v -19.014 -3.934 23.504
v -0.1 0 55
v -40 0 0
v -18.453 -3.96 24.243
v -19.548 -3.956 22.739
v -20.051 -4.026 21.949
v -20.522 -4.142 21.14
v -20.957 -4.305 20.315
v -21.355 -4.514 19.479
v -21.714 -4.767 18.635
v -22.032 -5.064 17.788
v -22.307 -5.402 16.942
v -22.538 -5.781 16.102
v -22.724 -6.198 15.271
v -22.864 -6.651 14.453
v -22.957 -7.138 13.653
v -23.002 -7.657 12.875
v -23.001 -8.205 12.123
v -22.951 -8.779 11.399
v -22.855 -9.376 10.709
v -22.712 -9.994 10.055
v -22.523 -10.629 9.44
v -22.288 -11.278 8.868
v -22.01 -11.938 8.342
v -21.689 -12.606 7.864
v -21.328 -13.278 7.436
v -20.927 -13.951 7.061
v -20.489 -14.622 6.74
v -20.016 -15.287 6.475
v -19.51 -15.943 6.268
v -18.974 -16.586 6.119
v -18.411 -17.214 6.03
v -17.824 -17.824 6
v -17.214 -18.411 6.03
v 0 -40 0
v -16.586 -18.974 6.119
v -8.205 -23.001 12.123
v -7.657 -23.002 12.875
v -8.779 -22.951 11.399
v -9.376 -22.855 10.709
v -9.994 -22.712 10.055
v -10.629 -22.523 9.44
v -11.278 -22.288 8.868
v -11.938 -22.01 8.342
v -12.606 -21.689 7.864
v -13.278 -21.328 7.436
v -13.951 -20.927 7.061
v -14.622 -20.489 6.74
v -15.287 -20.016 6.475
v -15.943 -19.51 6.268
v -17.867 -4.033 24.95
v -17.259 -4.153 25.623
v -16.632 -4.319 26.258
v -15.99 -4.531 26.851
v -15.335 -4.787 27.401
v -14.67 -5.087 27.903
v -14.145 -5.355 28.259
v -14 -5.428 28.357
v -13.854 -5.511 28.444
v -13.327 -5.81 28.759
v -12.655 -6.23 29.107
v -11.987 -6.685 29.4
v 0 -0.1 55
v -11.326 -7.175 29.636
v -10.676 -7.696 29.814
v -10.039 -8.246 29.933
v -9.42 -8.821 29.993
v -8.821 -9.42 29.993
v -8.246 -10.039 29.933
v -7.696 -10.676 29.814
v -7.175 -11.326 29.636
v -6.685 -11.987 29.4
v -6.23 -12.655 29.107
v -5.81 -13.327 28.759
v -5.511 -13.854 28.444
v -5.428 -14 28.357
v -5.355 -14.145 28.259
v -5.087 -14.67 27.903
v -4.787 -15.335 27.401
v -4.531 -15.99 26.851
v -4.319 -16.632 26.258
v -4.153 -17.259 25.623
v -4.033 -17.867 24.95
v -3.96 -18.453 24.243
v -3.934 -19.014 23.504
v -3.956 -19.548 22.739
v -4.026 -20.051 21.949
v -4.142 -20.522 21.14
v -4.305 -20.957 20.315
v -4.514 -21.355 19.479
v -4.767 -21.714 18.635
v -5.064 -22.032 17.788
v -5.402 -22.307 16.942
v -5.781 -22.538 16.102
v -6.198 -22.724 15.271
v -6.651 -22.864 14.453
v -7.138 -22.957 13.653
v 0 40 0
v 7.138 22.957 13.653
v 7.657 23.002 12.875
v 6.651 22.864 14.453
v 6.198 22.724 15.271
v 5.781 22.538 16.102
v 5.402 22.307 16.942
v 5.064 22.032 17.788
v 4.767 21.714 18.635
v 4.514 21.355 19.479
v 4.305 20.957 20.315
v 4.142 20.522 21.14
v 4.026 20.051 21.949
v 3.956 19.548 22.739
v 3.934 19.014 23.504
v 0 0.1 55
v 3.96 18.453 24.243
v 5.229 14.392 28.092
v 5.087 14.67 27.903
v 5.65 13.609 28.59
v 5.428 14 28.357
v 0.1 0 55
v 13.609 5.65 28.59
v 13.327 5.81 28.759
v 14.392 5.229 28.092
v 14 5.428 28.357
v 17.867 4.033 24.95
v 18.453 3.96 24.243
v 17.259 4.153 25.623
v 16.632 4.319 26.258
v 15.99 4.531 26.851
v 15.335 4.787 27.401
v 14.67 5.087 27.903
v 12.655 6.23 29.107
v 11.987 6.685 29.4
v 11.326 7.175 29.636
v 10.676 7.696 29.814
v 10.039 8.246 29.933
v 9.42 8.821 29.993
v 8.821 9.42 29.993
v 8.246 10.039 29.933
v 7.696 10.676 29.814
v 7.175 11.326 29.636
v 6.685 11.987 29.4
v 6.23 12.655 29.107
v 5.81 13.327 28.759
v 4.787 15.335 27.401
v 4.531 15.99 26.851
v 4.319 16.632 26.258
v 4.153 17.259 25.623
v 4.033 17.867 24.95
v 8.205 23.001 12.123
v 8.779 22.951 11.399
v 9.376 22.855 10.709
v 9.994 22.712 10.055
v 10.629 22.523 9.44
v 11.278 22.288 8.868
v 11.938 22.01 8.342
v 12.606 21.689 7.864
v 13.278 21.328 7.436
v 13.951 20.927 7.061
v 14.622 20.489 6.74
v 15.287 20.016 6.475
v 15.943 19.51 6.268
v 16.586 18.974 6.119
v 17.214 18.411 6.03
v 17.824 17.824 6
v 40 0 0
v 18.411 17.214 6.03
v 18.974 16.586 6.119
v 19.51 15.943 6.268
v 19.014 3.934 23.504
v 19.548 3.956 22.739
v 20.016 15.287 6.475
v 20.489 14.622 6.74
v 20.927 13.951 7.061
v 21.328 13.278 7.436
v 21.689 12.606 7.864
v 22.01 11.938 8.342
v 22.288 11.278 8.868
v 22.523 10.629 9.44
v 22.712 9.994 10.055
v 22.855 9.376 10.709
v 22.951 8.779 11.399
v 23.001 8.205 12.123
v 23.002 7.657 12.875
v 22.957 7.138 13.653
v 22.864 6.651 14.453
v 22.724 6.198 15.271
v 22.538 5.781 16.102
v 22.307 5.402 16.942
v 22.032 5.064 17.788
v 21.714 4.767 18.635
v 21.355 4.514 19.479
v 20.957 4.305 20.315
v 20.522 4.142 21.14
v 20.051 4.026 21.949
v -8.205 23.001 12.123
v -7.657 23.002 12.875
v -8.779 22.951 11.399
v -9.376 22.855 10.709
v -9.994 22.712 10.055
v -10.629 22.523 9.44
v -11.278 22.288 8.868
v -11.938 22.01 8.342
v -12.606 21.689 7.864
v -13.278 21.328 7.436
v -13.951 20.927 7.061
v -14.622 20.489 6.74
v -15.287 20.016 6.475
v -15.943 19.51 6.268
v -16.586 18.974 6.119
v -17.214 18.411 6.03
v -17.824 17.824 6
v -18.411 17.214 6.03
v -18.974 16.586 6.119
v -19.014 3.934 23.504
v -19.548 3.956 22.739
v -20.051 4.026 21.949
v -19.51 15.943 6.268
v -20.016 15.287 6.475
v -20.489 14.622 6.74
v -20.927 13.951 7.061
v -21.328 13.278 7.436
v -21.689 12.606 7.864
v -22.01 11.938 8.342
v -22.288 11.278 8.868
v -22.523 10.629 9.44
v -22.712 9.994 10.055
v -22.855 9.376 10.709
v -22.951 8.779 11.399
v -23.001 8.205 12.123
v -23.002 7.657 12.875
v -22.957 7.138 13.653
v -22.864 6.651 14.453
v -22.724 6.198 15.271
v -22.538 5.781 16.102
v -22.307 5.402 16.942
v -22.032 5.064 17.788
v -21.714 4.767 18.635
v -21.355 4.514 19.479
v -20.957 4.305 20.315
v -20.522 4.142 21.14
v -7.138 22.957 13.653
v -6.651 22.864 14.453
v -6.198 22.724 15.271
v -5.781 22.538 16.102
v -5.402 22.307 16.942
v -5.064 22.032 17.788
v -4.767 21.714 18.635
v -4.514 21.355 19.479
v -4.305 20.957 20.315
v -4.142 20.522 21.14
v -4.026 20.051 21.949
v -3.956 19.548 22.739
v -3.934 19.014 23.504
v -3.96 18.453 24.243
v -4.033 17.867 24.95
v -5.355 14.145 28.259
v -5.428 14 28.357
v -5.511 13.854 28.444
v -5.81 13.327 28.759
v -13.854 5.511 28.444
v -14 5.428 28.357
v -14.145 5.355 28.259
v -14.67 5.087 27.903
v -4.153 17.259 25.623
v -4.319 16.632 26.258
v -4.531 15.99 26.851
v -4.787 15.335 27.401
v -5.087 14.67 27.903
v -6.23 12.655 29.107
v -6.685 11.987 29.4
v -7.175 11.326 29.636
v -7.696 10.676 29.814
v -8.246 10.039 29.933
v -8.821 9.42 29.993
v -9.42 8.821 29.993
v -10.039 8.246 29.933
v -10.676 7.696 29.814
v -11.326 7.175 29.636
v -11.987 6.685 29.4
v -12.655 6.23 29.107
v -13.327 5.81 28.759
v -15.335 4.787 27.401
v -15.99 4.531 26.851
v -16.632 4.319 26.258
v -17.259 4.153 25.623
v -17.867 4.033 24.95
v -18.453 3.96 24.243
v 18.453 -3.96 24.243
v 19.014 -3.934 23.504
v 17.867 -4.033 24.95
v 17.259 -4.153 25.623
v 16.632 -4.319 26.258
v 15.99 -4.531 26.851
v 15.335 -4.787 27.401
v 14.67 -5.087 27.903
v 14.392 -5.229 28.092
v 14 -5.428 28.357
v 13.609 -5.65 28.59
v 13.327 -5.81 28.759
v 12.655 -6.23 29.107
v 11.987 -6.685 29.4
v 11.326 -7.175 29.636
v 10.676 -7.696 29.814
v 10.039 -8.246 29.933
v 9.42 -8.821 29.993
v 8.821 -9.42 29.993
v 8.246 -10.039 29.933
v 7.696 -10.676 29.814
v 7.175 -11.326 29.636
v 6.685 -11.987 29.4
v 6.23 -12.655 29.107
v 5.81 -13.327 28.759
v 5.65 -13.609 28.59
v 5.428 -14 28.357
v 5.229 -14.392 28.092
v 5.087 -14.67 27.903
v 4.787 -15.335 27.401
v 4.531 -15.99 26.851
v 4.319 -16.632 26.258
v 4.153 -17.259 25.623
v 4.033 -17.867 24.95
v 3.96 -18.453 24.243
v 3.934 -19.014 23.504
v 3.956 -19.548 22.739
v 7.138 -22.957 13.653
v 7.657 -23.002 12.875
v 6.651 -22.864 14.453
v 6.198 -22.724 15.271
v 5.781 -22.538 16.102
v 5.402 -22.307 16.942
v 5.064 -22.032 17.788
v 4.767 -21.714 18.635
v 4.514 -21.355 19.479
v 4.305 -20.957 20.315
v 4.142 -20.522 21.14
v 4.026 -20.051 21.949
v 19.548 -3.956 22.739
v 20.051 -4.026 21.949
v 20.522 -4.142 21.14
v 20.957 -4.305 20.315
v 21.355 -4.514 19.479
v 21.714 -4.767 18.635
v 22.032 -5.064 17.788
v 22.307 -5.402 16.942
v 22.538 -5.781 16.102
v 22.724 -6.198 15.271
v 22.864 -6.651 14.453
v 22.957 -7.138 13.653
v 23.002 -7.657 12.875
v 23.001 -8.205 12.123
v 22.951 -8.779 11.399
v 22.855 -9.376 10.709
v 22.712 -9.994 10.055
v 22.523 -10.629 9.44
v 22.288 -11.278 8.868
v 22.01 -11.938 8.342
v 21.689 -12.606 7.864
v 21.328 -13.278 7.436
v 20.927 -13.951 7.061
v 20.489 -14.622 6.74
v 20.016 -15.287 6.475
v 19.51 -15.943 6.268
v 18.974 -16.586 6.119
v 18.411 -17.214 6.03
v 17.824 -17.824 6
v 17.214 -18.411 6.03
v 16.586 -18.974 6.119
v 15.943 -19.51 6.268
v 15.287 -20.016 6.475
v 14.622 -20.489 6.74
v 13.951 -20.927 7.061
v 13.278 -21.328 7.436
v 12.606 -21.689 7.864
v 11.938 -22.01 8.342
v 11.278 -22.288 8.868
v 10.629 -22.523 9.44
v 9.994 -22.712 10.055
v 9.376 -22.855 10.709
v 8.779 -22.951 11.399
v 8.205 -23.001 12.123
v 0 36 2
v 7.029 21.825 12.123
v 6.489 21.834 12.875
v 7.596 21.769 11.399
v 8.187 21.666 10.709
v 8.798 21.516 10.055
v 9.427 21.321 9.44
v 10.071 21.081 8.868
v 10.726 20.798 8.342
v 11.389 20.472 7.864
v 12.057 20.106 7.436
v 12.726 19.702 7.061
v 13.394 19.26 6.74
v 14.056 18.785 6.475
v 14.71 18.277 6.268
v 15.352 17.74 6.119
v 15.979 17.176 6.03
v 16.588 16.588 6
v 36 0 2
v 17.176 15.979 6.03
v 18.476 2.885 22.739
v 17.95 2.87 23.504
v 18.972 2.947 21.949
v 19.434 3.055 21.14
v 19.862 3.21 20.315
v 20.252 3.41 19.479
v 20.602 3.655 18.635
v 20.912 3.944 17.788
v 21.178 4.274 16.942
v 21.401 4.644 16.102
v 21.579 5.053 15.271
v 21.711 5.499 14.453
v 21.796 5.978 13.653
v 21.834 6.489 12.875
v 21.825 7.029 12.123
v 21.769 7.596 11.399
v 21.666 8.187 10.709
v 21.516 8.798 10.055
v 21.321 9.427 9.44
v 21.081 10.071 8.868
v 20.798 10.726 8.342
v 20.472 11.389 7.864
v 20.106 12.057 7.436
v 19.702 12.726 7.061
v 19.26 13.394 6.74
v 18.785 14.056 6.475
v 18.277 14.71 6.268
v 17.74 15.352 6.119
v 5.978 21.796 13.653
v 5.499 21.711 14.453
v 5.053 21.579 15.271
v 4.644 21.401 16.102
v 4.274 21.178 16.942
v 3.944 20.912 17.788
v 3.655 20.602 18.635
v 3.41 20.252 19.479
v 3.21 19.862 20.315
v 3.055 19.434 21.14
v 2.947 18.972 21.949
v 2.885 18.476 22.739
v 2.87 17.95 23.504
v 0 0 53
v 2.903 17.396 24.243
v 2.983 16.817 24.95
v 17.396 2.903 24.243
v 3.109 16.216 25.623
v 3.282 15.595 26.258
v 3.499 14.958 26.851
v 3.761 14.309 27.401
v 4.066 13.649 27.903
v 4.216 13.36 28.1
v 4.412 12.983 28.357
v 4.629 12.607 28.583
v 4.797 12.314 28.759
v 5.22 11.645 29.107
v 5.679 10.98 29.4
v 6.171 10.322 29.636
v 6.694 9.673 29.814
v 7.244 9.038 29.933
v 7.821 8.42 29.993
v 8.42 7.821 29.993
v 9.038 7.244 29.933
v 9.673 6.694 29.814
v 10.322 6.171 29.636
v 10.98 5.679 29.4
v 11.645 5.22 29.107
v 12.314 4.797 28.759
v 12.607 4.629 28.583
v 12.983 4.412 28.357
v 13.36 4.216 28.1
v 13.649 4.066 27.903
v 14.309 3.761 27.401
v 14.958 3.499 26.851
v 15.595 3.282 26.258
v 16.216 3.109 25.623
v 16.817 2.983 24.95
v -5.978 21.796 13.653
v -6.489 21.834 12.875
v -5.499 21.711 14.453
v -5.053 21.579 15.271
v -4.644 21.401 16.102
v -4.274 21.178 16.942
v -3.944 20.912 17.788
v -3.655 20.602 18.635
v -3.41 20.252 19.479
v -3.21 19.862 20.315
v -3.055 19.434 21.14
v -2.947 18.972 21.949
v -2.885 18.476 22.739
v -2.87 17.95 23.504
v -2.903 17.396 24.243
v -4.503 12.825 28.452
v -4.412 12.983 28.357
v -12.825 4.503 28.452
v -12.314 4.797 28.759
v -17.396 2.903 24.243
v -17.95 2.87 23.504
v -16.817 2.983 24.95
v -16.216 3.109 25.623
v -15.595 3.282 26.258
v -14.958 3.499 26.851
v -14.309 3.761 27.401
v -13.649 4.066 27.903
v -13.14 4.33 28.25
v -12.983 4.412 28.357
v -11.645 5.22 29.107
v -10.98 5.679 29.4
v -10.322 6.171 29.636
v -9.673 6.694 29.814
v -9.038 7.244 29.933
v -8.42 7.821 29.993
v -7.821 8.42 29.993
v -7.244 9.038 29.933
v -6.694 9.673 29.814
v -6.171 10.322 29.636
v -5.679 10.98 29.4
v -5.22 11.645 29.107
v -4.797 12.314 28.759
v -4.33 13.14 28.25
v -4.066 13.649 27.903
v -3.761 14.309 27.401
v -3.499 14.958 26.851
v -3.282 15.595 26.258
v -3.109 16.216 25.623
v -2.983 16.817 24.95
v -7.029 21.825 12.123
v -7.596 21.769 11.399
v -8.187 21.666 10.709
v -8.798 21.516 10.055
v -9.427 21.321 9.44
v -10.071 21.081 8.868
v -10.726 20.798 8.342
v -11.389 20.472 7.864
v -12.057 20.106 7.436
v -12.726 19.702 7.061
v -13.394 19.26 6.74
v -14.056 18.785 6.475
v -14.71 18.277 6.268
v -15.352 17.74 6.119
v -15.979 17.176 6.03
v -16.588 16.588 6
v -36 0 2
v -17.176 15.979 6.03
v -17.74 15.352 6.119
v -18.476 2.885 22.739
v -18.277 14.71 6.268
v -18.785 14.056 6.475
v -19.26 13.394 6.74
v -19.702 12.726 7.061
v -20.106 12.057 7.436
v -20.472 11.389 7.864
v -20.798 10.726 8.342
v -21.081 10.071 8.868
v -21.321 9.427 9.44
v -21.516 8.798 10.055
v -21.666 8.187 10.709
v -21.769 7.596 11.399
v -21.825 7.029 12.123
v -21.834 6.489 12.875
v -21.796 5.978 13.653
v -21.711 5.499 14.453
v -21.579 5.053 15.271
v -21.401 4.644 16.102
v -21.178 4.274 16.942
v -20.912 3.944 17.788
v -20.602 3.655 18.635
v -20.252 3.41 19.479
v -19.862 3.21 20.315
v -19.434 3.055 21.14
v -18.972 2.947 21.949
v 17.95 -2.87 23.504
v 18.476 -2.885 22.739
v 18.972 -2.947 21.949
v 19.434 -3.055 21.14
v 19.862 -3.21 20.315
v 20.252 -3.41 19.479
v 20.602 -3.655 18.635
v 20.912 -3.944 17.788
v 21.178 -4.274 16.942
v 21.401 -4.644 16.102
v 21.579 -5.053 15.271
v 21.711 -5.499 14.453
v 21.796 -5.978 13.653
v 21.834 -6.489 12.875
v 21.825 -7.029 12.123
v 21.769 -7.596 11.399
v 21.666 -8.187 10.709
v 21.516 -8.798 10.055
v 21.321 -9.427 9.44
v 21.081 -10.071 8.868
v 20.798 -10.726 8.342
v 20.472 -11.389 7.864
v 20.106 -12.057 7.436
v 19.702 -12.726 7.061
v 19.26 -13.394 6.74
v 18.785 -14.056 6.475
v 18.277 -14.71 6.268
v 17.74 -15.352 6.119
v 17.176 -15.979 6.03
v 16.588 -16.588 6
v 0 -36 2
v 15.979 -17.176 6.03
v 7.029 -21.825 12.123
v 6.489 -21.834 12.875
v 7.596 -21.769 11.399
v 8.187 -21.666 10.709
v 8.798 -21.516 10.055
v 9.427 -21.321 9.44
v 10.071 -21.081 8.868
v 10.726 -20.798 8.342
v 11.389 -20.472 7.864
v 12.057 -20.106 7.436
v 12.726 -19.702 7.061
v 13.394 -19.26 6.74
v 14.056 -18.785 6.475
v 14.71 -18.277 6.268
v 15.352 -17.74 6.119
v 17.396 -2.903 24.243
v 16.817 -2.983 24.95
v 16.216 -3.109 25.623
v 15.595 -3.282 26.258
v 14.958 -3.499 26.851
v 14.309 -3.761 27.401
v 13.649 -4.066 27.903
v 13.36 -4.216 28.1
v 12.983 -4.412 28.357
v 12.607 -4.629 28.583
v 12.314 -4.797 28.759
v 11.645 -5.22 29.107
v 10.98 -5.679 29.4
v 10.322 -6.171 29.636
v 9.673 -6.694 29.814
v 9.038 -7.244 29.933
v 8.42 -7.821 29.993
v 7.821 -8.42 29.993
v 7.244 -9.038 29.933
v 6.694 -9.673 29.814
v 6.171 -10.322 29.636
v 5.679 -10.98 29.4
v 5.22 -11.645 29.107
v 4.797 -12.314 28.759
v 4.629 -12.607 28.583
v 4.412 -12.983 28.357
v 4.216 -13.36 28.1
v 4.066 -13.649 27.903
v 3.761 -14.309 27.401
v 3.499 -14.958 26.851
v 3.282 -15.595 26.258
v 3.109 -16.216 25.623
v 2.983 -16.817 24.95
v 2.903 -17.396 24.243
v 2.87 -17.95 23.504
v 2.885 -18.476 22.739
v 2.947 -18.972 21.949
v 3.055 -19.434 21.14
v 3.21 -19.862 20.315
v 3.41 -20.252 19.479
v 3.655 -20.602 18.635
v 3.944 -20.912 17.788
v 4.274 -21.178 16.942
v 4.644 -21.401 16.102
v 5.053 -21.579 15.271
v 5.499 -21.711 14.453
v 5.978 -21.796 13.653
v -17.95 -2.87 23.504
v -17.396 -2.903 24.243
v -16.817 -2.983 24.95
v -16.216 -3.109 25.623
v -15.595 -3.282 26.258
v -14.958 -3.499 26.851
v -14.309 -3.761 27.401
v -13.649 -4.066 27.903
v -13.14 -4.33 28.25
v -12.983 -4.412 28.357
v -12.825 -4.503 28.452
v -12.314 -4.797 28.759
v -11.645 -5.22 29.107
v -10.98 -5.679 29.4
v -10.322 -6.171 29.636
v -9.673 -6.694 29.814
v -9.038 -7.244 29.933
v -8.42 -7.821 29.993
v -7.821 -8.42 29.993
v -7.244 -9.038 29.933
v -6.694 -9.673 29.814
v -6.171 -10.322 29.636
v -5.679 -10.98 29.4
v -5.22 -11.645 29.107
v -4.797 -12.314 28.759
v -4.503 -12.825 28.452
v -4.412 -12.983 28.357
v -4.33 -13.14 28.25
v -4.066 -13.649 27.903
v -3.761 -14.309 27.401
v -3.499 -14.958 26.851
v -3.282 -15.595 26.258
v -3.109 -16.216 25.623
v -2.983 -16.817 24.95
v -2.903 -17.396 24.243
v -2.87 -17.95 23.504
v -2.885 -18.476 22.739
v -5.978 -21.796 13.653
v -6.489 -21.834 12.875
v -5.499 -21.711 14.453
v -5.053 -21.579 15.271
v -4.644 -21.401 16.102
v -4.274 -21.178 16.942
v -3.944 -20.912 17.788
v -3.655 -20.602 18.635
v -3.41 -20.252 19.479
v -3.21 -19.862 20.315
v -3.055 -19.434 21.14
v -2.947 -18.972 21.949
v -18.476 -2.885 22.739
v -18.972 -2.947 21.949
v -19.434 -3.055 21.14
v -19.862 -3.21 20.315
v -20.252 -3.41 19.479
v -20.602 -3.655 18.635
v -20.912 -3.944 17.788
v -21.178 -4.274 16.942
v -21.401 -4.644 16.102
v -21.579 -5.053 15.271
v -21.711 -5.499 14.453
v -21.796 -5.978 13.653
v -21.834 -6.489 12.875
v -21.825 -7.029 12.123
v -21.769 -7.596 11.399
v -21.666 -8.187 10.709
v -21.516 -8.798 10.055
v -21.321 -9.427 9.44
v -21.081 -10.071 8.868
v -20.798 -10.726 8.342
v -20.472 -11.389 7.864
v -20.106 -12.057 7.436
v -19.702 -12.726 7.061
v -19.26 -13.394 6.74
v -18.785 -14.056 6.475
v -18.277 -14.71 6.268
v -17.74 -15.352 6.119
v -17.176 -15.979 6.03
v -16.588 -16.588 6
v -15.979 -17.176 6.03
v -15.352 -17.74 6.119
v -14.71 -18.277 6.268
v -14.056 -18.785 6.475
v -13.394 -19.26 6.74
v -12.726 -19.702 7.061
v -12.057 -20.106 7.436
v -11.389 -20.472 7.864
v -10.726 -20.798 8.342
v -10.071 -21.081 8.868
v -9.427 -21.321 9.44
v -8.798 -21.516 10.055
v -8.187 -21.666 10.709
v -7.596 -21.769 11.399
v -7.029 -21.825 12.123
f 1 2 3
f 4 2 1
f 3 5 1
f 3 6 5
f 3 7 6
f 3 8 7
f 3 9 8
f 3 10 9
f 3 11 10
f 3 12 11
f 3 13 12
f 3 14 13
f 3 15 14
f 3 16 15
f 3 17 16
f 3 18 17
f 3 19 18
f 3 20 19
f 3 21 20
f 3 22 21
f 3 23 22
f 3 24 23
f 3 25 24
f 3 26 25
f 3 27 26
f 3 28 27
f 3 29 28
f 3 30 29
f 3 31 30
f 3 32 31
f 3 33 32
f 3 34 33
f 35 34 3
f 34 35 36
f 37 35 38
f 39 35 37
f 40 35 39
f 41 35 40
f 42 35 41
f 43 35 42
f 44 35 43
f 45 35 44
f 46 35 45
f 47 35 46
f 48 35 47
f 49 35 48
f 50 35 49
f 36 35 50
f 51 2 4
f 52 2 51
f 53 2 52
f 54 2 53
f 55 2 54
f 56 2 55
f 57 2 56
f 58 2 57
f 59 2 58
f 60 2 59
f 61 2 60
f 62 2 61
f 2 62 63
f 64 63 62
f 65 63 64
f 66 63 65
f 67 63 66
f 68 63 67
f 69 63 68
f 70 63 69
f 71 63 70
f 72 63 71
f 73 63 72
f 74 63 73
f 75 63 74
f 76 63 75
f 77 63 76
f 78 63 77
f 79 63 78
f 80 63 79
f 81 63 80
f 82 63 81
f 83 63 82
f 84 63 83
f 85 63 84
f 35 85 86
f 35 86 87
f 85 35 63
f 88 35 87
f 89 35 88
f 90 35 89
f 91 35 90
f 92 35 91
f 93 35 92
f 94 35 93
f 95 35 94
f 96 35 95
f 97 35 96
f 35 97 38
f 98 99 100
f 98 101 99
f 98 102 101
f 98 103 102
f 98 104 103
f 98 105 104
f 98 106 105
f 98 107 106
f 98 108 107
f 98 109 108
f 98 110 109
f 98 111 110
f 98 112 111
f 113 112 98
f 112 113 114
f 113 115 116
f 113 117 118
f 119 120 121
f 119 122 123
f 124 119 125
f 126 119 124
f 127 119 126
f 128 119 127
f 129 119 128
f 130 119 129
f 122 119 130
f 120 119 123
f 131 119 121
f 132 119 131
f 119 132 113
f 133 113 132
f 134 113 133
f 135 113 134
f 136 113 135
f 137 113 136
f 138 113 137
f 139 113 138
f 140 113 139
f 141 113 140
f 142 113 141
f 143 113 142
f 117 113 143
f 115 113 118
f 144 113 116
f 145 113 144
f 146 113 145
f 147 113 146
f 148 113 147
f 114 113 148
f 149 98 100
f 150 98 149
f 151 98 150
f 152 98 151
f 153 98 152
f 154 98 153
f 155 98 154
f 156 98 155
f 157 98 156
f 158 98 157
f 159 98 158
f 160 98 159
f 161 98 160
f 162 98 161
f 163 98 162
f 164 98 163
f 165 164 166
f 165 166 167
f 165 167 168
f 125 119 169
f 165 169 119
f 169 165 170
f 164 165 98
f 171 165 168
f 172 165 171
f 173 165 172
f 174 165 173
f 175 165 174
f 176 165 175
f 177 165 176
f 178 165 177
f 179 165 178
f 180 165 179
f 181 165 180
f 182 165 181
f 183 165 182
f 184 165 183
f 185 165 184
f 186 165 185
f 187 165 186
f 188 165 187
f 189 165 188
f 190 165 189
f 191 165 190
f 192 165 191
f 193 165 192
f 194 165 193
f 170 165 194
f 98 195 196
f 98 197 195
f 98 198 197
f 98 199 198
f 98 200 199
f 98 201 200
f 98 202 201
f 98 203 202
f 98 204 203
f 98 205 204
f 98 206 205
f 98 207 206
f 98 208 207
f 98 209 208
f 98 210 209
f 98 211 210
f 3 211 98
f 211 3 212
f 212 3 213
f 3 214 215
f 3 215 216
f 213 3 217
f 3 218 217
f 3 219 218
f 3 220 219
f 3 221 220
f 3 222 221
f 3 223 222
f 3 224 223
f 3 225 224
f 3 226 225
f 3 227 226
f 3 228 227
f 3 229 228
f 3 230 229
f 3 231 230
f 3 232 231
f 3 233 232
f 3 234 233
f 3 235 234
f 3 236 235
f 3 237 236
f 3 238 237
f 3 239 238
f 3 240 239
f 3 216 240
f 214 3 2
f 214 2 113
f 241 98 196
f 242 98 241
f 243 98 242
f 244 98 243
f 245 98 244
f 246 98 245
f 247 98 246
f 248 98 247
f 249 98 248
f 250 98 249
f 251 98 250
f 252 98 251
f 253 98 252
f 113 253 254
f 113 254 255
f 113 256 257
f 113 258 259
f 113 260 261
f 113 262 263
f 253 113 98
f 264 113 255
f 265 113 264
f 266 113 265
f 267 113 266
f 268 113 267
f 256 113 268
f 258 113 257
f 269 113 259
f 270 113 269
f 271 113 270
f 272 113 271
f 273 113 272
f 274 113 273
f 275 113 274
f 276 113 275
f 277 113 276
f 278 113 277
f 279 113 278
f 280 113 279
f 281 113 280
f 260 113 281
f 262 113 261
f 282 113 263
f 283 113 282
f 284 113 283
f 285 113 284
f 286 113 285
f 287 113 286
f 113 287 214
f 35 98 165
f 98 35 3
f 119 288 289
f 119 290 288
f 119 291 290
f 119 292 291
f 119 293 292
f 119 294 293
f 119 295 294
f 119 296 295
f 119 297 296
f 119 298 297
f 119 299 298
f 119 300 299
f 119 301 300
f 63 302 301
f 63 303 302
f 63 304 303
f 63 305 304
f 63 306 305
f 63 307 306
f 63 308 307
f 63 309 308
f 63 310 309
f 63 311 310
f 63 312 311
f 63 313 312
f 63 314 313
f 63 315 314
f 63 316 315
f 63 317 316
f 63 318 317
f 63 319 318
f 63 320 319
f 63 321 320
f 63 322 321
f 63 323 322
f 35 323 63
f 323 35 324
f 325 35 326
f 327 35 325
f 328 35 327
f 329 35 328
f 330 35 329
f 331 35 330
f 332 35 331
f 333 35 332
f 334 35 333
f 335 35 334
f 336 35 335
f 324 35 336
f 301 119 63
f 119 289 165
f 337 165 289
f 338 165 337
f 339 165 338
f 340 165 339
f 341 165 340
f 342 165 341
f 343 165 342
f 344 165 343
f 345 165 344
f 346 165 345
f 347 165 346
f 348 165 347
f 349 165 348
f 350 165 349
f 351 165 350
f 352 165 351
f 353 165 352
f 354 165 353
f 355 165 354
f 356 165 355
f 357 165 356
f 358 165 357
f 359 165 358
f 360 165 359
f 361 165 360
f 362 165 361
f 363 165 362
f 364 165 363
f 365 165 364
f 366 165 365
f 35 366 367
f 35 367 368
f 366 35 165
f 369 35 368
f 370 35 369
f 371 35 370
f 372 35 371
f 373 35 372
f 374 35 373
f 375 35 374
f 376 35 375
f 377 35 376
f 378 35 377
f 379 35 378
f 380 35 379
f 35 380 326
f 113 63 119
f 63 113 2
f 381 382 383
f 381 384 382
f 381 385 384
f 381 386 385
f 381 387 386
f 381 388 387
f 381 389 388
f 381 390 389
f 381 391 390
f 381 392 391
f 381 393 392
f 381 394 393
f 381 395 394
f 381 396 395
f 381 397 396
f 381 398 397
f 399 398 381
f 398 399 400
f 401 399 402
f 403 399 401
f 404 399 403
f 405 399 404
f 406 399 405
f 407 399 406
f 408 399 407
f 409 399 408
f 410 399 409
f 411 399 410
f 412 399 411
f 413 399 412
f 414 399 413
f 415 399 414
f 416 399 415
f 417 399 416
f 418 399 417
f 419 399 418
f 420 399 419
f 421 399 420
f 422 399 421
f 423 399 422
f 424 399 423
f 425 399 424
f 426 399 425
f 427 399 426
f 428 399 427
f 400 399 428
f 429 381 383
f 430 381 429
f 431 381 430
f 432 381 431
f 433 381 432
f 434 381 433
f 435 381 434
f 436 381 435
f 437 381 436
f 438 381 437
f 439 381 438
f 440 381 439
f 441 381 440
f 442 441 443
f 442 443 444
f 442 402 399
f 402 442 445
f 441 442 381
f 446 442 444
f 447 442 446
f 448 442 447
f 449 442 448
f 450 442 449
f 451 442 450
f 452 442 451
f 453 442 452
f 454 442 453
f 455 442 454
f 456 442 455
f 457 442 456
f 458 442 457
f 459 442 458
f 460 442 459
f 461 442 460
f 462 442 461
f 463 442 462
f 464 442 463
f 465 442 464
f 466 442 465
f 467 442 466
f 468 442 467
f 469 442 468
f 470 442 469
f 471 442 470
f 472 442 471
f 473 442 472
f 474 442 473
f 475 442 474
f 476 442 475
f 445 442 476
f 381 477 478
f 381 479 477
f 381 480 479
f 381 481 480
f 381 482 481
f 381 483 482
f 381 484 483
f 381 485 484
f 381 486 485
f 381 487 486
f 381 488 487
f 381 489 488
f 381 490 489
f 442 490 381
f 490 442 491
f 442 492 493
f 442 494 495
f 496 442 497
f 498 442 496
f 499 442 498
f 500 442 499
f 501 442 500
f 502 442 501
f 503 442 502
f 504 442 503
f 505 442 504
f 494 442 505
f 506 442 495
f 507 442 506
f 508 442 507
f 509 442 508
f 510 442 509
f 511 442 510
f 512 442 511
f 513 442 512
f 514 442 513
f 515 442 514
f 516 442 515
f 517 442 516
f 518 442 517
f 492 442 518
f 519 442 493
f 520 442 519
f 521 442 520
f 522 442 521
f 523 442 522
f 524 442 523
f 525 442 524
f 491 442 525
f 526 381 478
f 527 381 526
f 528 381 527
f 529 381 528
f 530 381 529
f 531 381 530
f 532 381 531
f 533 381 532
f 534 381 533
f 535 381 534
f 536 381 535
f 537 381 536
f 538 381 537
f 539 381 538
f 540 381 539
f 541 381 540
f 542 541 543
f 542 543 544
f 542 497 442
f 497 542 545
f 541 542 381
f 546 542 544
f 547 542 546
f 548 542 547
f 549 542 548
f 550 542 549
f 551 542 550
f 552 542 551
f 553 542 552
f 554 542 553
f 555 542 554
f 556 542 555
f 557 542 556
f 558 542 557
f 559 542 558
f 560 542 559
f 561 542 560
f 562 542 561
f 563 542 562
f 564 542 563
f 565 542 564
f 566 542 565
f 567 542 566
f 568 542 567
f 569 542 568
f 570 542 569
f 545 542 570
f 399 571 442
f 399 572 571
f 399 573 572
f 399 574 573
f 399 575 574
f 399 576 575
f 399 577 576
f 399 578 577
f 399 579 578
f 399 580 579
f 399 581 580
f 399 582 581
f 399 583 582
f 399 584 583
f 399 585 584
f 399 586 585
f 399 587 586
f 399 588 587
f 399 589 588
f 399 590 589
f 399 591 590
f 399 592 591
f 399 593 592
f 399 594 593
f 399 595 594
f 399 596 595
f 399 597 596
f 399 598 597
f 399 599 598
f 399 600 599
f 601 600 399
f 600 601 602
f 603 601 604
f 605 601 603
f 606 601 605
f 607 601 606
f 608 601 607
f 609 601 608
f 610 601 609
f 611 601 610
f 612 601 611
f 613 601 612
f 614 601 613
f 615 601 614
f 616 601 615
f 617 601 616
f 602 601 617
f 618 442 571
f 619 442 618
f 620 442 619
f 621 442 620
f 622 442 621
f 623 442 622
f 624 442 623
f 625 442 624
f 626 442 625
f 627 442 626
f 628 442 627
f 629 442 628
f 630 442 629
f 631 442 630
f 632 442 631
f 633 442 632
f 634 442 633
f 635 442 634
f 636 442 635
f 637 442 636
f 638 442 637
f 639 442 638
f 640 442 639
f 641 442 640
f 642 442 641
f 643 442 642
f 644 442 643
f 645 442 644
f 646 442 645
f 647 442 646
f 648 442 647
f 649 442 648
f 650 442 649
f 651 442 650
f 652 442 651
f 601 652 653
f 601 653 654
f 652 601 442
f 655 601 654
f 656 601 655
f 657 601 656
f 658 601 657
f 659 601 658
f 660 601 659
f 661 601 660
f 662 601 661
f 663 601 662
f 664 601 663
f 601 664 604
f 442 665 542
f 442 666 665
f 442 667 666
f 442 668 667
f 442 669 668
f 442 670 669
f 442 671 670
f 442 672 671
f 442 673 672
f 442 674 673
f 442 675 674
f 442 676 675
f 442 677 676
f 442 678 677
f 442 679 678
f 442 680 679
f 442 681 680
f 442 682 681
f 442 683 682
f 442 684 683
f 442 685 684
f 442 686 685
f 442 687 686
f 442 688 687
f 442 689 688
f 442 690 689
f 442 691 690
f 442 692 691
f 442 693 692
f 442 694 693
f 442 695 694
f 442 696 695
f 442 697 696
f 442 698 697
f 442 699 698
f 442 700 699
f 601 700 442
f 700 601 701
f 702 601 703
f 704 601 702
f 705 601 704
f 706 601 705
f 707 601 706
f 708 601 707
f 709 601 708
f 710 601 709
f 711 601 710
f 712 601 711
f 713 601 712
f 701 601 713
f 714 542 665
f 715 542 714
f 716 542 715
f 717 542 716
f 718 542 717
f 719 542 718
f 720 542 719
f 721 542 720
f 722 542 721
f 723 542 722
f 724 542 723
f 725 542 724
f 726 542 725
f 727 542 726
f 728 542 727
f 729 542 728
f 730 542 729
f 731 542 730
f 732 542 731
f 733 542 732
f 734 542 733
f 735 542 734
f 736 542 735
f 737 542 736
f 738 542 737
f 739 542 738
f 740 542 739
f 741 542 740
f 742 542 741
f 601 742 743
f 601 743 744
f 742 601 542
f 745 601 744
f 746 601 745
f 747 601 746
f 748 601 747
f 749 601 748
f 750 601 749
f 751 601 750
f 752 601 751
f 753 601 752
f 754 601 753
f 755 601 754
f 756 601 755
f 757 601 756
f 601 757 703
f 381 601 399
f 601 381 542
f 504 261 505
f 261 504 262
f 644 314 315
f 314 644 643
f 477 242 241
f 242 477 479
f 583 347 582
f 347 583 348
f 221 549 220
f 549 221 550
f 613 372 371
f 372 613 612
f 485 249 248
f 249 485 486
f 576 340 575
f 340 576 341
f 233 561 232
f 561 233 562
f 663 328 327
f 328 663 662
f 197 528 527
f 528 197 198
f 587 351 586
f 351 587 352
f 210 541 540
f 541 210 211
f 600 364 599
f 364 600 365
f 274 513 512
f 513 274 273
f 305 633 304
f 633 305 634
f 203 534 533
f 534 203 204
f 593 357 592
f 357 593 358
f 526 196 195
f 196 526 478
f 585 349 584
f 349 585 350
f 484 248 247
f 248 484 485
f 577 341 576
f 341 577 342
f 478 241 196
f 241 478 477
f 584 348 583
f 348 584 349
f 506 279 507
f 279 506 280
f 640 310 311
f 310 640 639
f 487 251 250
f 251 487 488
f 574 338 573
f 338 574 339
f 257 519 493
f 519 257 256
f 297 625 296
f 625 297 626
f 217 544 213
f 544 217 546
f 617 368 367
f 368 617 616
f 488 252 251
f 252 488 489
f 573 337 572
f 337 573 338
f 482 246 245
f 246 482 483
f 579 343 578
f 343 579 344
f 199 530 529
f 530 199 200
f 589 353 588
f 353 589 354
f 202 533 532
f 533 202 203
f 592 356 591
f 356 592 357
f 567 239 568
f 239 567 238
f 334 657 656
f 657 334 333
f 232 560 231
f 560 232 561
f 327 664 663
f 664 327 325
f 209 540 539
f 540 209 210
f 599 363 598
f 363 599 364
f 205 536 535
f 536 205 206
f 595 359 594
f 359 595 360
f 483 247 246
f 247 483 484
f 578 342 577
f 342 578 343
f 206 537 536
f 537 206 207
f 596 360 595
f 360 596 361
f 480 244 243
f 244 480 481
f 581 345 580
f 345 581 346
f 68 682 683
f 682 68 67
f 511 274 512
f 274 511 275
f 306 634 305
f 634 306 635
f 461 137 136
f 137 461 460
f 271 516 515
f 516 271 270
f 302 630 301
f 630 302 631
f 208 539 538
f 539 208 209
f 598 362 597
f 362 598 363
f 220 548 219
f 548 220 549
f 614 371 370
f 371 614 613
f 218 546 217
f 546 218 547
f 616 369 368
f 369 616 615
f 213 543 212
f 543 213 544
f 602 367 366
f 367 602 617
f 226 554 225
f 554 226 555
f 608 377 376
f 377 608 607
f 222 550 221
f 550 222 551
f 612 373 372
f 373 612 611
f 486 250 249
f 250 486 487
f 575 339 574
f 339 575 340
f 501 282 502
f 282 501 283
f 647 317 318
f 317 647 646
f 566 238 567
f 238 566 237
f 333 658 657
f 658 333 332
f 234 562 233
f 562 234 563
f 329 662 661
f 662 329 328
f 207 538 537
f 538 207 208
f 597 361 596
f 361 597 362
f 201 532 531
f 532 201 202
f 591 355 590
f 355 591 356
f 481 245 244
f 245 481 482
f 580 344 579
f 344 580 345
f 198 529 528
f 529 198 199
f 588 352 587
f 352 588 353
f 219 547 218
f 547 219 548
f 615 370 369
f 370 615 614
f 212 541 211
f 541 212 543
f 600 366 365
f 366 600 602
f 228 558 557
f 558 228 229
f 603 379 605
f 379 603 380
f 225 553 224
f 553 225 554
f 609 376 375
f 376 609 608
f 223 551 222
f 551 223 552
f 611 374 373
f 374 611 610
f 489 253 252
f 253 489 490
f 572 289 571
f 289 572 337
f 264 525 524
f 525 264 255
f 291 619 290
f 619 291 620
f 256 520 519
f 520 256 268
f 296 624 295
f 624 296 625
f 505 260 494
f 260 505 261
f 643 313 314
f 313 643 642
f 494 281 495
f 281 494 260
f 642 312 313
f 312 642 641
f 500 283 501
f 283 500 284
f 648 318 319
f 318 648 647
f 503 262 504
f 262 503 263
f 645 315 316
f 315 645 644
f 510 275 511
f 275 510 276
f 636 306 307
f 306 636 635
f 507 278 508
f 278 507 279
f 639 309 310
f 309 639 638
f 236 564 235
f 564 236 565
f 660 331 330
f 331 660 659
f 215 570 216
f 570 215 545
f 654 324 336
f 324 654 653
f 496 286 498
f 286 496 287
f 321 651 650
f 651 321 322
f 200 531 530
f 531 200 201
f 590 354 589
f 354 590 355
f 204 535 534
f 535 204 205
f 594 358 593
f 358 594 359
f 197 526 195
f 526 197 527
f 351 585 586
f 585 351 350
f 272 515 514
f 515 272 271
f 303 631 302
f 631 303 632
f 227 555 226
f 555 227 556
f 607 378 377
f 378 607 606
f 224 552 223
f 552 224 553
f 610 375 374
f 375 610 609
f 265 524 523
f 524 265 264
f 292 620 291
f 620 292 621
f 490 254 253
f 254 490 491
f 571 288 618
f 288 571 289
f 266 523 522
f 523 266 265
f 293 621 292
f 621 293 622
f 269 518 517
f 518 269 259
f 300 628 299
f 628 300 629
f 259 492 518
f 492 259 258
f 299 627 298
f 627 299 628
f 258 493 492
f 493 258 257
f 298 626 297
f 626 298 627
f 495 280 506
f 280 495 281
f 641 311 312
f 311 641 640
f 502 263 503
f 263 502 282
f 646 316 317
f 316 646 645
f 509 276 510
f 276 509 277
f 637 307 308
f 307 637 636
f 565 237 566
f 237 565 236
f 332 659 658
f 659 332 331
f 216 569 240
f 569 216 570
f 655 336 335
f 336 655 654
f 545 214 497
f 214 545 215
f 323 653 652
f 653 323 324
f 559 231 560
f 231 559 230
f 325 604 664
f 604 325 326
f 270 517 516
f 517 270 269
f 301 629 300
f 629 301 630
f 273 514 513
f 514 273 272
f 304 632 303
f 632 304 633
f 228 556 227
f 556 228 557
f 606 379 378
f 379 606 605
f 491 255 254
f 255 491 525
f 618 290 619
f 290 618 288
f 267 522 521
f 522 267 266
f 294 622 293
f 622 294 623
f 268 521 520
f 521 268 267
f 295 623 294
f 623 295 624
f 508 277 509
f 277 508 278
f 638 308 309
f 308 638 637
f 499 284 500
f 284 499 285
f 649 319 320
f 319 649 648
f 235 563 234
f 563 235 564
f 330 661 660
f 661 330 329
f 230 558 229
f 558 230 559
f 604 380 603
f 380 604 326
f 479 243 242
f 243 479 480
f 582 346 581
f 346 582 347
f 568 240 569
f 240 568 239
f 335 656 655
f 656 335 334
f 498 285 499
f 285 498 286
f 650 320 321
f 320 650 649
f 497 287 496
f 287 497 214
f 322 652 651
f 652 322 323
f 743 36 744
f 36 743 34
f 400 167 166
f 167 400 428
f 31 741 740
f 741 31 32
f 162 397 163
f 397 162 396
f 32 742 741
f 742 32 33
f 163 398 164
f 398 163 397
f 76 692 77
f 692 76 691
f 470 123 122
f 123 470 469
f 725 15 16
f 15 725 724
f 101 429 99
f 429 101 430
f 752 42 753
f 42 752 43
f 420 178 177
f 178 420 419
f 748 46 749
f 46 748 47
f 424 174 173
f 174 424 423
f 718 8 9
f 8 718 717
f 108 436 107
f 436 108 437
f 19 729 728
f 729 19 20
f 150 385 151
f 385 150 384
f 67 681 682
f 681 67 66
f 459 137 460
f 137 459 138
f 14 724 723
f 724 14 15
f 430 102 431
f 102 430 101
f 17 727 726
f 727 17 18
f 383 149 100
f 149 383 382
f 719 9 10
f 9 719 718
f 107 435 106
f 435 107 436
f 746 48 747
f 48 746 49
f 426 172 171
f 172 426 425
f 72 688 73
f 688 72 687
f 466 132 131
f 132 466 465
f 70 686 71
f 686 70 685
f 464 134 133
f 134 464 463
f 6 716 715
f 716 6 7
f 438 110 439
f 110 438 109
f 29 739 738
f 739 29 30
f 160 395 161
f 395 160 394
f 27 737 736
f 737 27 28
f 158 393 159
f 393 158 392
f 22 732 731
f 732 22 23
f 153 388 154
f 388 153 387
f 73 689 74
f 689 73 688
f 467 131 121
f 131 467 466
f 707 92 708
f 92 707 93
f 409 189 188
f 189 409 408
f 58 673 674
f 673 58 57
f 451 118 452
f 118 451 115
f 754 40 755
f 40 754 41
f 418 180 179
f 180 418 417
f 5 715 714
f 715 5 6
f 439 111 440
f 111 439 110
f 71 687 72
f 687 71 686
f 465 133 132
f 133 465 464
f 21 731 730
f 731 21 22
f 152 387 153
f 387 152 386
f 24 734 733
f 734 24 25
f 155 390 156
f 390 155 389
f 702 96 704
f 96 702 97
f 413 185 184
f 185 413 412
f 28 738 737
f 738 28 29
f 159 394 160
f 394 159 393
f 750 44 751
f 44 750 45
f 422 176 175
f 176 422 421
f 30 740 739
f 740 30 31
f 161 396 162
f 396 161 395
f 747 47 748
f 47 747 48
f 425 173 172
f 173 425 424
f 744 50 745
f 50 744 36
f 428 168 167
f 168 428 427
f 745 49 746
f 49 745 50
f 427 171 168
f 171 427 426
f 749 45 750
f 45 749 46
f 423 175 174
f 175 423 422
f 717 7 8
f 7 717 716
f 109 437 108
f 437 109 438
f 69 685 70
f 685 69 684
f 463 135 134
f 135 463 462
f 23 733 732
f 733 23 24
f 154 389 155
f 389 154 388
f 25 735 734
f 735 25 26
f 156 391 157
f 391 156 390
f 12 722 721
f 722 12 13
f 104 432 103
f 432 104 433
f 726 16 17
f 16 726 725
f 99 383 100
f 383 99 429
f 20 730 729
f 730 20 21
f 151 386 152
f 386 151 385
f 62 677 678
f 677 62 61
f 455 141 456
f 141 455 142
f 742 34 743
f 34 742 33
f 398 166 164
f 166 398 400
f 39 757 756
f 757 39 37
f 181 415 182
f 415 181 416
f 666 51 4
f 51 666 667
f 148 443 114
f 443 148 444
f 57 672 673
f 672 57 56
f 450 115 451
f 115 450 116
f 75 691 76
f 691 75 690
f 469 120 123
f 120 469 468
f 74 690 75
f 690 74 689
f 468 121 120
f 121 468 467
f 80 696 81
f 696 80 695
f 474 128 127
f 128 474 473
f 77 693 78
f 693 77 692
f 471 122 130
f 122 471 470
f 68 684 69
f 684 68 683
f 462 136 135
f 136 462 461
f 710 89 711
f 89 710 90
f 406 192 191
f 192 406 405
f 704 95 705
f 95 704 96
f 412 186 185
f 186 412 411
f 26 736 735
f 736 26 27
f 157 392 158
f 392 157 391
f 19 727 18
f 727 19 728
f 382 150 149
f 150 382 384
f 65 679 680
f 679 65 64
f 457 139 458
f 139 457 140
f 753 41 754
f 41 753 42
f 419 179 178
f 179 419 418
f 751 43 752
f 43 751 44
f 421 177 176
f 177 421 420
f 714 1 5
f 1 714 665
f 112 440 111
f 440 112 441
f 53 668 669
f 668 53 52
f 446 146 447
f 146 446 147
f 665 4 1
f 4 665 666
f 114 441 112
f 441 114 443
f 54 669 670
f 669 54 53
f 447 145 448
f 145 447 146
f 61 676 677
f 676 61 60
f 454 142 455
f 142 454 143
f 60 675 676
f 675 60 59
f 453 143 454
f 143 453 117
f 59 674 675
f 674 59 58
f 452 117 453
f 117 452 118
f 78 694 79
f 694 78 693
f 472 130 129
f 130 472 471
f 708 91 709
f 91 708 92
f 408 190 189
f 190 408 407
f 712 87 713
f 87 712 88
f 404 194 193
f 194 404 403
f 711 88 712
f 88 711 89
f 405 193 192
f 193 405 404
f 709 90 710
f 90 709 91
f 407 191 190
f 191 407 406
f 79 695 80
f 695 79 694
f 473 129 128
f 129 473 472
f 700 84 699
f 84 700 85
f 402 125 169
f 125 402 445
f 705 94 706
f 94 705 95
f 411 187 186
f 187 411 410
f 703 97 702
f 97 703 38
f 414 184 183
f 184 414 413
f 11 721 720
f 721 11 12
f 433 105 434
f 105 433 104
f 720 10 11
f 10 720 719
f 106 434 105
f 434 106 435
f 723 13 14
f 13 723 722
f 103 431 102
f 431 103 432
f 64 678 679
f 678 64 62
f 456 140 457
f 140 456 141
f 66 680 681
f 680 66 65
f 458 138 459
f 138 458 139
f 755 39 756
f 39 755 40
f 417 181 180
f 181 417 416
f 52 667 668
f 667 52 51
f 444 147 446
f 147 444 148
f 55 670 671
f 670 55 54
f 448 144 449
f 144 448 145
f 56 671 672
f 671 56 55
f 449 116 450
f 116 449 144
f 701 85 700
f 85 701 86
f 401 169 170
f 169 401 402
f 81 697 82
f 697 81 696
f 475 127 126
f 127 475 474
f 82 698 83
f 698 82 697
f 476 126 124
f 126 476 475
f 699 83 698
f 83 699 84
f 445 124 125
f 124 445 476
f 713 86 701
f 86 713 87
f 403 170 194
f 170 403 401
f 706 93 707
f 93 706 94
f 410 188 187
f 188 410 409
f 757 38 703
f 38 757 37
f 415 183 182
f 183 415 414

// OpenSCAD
// piramid to be used to handle bigger elements edges during painting


module piramid() {
    $fn=4;
    difference() {
        cylinder(55,40,0.1, false);

        translate([0,0,2]) {
            cylinder(51,36, 0, false);
        }
    }
}

module holes() {
    $fn=89;
    union() {
        rotate([45, 90, 0]) {
            translate([-18,0,-30]) {
                cylinder(75, 12, 12, false);
            }
        }

        rotate([-45, 90, 0]) {
            translate([-18,0,-30]) {
                cylinder(75, 12, 12, false);
            }
        }
    }
}

difference() {
    piramid();
    holes();
}
